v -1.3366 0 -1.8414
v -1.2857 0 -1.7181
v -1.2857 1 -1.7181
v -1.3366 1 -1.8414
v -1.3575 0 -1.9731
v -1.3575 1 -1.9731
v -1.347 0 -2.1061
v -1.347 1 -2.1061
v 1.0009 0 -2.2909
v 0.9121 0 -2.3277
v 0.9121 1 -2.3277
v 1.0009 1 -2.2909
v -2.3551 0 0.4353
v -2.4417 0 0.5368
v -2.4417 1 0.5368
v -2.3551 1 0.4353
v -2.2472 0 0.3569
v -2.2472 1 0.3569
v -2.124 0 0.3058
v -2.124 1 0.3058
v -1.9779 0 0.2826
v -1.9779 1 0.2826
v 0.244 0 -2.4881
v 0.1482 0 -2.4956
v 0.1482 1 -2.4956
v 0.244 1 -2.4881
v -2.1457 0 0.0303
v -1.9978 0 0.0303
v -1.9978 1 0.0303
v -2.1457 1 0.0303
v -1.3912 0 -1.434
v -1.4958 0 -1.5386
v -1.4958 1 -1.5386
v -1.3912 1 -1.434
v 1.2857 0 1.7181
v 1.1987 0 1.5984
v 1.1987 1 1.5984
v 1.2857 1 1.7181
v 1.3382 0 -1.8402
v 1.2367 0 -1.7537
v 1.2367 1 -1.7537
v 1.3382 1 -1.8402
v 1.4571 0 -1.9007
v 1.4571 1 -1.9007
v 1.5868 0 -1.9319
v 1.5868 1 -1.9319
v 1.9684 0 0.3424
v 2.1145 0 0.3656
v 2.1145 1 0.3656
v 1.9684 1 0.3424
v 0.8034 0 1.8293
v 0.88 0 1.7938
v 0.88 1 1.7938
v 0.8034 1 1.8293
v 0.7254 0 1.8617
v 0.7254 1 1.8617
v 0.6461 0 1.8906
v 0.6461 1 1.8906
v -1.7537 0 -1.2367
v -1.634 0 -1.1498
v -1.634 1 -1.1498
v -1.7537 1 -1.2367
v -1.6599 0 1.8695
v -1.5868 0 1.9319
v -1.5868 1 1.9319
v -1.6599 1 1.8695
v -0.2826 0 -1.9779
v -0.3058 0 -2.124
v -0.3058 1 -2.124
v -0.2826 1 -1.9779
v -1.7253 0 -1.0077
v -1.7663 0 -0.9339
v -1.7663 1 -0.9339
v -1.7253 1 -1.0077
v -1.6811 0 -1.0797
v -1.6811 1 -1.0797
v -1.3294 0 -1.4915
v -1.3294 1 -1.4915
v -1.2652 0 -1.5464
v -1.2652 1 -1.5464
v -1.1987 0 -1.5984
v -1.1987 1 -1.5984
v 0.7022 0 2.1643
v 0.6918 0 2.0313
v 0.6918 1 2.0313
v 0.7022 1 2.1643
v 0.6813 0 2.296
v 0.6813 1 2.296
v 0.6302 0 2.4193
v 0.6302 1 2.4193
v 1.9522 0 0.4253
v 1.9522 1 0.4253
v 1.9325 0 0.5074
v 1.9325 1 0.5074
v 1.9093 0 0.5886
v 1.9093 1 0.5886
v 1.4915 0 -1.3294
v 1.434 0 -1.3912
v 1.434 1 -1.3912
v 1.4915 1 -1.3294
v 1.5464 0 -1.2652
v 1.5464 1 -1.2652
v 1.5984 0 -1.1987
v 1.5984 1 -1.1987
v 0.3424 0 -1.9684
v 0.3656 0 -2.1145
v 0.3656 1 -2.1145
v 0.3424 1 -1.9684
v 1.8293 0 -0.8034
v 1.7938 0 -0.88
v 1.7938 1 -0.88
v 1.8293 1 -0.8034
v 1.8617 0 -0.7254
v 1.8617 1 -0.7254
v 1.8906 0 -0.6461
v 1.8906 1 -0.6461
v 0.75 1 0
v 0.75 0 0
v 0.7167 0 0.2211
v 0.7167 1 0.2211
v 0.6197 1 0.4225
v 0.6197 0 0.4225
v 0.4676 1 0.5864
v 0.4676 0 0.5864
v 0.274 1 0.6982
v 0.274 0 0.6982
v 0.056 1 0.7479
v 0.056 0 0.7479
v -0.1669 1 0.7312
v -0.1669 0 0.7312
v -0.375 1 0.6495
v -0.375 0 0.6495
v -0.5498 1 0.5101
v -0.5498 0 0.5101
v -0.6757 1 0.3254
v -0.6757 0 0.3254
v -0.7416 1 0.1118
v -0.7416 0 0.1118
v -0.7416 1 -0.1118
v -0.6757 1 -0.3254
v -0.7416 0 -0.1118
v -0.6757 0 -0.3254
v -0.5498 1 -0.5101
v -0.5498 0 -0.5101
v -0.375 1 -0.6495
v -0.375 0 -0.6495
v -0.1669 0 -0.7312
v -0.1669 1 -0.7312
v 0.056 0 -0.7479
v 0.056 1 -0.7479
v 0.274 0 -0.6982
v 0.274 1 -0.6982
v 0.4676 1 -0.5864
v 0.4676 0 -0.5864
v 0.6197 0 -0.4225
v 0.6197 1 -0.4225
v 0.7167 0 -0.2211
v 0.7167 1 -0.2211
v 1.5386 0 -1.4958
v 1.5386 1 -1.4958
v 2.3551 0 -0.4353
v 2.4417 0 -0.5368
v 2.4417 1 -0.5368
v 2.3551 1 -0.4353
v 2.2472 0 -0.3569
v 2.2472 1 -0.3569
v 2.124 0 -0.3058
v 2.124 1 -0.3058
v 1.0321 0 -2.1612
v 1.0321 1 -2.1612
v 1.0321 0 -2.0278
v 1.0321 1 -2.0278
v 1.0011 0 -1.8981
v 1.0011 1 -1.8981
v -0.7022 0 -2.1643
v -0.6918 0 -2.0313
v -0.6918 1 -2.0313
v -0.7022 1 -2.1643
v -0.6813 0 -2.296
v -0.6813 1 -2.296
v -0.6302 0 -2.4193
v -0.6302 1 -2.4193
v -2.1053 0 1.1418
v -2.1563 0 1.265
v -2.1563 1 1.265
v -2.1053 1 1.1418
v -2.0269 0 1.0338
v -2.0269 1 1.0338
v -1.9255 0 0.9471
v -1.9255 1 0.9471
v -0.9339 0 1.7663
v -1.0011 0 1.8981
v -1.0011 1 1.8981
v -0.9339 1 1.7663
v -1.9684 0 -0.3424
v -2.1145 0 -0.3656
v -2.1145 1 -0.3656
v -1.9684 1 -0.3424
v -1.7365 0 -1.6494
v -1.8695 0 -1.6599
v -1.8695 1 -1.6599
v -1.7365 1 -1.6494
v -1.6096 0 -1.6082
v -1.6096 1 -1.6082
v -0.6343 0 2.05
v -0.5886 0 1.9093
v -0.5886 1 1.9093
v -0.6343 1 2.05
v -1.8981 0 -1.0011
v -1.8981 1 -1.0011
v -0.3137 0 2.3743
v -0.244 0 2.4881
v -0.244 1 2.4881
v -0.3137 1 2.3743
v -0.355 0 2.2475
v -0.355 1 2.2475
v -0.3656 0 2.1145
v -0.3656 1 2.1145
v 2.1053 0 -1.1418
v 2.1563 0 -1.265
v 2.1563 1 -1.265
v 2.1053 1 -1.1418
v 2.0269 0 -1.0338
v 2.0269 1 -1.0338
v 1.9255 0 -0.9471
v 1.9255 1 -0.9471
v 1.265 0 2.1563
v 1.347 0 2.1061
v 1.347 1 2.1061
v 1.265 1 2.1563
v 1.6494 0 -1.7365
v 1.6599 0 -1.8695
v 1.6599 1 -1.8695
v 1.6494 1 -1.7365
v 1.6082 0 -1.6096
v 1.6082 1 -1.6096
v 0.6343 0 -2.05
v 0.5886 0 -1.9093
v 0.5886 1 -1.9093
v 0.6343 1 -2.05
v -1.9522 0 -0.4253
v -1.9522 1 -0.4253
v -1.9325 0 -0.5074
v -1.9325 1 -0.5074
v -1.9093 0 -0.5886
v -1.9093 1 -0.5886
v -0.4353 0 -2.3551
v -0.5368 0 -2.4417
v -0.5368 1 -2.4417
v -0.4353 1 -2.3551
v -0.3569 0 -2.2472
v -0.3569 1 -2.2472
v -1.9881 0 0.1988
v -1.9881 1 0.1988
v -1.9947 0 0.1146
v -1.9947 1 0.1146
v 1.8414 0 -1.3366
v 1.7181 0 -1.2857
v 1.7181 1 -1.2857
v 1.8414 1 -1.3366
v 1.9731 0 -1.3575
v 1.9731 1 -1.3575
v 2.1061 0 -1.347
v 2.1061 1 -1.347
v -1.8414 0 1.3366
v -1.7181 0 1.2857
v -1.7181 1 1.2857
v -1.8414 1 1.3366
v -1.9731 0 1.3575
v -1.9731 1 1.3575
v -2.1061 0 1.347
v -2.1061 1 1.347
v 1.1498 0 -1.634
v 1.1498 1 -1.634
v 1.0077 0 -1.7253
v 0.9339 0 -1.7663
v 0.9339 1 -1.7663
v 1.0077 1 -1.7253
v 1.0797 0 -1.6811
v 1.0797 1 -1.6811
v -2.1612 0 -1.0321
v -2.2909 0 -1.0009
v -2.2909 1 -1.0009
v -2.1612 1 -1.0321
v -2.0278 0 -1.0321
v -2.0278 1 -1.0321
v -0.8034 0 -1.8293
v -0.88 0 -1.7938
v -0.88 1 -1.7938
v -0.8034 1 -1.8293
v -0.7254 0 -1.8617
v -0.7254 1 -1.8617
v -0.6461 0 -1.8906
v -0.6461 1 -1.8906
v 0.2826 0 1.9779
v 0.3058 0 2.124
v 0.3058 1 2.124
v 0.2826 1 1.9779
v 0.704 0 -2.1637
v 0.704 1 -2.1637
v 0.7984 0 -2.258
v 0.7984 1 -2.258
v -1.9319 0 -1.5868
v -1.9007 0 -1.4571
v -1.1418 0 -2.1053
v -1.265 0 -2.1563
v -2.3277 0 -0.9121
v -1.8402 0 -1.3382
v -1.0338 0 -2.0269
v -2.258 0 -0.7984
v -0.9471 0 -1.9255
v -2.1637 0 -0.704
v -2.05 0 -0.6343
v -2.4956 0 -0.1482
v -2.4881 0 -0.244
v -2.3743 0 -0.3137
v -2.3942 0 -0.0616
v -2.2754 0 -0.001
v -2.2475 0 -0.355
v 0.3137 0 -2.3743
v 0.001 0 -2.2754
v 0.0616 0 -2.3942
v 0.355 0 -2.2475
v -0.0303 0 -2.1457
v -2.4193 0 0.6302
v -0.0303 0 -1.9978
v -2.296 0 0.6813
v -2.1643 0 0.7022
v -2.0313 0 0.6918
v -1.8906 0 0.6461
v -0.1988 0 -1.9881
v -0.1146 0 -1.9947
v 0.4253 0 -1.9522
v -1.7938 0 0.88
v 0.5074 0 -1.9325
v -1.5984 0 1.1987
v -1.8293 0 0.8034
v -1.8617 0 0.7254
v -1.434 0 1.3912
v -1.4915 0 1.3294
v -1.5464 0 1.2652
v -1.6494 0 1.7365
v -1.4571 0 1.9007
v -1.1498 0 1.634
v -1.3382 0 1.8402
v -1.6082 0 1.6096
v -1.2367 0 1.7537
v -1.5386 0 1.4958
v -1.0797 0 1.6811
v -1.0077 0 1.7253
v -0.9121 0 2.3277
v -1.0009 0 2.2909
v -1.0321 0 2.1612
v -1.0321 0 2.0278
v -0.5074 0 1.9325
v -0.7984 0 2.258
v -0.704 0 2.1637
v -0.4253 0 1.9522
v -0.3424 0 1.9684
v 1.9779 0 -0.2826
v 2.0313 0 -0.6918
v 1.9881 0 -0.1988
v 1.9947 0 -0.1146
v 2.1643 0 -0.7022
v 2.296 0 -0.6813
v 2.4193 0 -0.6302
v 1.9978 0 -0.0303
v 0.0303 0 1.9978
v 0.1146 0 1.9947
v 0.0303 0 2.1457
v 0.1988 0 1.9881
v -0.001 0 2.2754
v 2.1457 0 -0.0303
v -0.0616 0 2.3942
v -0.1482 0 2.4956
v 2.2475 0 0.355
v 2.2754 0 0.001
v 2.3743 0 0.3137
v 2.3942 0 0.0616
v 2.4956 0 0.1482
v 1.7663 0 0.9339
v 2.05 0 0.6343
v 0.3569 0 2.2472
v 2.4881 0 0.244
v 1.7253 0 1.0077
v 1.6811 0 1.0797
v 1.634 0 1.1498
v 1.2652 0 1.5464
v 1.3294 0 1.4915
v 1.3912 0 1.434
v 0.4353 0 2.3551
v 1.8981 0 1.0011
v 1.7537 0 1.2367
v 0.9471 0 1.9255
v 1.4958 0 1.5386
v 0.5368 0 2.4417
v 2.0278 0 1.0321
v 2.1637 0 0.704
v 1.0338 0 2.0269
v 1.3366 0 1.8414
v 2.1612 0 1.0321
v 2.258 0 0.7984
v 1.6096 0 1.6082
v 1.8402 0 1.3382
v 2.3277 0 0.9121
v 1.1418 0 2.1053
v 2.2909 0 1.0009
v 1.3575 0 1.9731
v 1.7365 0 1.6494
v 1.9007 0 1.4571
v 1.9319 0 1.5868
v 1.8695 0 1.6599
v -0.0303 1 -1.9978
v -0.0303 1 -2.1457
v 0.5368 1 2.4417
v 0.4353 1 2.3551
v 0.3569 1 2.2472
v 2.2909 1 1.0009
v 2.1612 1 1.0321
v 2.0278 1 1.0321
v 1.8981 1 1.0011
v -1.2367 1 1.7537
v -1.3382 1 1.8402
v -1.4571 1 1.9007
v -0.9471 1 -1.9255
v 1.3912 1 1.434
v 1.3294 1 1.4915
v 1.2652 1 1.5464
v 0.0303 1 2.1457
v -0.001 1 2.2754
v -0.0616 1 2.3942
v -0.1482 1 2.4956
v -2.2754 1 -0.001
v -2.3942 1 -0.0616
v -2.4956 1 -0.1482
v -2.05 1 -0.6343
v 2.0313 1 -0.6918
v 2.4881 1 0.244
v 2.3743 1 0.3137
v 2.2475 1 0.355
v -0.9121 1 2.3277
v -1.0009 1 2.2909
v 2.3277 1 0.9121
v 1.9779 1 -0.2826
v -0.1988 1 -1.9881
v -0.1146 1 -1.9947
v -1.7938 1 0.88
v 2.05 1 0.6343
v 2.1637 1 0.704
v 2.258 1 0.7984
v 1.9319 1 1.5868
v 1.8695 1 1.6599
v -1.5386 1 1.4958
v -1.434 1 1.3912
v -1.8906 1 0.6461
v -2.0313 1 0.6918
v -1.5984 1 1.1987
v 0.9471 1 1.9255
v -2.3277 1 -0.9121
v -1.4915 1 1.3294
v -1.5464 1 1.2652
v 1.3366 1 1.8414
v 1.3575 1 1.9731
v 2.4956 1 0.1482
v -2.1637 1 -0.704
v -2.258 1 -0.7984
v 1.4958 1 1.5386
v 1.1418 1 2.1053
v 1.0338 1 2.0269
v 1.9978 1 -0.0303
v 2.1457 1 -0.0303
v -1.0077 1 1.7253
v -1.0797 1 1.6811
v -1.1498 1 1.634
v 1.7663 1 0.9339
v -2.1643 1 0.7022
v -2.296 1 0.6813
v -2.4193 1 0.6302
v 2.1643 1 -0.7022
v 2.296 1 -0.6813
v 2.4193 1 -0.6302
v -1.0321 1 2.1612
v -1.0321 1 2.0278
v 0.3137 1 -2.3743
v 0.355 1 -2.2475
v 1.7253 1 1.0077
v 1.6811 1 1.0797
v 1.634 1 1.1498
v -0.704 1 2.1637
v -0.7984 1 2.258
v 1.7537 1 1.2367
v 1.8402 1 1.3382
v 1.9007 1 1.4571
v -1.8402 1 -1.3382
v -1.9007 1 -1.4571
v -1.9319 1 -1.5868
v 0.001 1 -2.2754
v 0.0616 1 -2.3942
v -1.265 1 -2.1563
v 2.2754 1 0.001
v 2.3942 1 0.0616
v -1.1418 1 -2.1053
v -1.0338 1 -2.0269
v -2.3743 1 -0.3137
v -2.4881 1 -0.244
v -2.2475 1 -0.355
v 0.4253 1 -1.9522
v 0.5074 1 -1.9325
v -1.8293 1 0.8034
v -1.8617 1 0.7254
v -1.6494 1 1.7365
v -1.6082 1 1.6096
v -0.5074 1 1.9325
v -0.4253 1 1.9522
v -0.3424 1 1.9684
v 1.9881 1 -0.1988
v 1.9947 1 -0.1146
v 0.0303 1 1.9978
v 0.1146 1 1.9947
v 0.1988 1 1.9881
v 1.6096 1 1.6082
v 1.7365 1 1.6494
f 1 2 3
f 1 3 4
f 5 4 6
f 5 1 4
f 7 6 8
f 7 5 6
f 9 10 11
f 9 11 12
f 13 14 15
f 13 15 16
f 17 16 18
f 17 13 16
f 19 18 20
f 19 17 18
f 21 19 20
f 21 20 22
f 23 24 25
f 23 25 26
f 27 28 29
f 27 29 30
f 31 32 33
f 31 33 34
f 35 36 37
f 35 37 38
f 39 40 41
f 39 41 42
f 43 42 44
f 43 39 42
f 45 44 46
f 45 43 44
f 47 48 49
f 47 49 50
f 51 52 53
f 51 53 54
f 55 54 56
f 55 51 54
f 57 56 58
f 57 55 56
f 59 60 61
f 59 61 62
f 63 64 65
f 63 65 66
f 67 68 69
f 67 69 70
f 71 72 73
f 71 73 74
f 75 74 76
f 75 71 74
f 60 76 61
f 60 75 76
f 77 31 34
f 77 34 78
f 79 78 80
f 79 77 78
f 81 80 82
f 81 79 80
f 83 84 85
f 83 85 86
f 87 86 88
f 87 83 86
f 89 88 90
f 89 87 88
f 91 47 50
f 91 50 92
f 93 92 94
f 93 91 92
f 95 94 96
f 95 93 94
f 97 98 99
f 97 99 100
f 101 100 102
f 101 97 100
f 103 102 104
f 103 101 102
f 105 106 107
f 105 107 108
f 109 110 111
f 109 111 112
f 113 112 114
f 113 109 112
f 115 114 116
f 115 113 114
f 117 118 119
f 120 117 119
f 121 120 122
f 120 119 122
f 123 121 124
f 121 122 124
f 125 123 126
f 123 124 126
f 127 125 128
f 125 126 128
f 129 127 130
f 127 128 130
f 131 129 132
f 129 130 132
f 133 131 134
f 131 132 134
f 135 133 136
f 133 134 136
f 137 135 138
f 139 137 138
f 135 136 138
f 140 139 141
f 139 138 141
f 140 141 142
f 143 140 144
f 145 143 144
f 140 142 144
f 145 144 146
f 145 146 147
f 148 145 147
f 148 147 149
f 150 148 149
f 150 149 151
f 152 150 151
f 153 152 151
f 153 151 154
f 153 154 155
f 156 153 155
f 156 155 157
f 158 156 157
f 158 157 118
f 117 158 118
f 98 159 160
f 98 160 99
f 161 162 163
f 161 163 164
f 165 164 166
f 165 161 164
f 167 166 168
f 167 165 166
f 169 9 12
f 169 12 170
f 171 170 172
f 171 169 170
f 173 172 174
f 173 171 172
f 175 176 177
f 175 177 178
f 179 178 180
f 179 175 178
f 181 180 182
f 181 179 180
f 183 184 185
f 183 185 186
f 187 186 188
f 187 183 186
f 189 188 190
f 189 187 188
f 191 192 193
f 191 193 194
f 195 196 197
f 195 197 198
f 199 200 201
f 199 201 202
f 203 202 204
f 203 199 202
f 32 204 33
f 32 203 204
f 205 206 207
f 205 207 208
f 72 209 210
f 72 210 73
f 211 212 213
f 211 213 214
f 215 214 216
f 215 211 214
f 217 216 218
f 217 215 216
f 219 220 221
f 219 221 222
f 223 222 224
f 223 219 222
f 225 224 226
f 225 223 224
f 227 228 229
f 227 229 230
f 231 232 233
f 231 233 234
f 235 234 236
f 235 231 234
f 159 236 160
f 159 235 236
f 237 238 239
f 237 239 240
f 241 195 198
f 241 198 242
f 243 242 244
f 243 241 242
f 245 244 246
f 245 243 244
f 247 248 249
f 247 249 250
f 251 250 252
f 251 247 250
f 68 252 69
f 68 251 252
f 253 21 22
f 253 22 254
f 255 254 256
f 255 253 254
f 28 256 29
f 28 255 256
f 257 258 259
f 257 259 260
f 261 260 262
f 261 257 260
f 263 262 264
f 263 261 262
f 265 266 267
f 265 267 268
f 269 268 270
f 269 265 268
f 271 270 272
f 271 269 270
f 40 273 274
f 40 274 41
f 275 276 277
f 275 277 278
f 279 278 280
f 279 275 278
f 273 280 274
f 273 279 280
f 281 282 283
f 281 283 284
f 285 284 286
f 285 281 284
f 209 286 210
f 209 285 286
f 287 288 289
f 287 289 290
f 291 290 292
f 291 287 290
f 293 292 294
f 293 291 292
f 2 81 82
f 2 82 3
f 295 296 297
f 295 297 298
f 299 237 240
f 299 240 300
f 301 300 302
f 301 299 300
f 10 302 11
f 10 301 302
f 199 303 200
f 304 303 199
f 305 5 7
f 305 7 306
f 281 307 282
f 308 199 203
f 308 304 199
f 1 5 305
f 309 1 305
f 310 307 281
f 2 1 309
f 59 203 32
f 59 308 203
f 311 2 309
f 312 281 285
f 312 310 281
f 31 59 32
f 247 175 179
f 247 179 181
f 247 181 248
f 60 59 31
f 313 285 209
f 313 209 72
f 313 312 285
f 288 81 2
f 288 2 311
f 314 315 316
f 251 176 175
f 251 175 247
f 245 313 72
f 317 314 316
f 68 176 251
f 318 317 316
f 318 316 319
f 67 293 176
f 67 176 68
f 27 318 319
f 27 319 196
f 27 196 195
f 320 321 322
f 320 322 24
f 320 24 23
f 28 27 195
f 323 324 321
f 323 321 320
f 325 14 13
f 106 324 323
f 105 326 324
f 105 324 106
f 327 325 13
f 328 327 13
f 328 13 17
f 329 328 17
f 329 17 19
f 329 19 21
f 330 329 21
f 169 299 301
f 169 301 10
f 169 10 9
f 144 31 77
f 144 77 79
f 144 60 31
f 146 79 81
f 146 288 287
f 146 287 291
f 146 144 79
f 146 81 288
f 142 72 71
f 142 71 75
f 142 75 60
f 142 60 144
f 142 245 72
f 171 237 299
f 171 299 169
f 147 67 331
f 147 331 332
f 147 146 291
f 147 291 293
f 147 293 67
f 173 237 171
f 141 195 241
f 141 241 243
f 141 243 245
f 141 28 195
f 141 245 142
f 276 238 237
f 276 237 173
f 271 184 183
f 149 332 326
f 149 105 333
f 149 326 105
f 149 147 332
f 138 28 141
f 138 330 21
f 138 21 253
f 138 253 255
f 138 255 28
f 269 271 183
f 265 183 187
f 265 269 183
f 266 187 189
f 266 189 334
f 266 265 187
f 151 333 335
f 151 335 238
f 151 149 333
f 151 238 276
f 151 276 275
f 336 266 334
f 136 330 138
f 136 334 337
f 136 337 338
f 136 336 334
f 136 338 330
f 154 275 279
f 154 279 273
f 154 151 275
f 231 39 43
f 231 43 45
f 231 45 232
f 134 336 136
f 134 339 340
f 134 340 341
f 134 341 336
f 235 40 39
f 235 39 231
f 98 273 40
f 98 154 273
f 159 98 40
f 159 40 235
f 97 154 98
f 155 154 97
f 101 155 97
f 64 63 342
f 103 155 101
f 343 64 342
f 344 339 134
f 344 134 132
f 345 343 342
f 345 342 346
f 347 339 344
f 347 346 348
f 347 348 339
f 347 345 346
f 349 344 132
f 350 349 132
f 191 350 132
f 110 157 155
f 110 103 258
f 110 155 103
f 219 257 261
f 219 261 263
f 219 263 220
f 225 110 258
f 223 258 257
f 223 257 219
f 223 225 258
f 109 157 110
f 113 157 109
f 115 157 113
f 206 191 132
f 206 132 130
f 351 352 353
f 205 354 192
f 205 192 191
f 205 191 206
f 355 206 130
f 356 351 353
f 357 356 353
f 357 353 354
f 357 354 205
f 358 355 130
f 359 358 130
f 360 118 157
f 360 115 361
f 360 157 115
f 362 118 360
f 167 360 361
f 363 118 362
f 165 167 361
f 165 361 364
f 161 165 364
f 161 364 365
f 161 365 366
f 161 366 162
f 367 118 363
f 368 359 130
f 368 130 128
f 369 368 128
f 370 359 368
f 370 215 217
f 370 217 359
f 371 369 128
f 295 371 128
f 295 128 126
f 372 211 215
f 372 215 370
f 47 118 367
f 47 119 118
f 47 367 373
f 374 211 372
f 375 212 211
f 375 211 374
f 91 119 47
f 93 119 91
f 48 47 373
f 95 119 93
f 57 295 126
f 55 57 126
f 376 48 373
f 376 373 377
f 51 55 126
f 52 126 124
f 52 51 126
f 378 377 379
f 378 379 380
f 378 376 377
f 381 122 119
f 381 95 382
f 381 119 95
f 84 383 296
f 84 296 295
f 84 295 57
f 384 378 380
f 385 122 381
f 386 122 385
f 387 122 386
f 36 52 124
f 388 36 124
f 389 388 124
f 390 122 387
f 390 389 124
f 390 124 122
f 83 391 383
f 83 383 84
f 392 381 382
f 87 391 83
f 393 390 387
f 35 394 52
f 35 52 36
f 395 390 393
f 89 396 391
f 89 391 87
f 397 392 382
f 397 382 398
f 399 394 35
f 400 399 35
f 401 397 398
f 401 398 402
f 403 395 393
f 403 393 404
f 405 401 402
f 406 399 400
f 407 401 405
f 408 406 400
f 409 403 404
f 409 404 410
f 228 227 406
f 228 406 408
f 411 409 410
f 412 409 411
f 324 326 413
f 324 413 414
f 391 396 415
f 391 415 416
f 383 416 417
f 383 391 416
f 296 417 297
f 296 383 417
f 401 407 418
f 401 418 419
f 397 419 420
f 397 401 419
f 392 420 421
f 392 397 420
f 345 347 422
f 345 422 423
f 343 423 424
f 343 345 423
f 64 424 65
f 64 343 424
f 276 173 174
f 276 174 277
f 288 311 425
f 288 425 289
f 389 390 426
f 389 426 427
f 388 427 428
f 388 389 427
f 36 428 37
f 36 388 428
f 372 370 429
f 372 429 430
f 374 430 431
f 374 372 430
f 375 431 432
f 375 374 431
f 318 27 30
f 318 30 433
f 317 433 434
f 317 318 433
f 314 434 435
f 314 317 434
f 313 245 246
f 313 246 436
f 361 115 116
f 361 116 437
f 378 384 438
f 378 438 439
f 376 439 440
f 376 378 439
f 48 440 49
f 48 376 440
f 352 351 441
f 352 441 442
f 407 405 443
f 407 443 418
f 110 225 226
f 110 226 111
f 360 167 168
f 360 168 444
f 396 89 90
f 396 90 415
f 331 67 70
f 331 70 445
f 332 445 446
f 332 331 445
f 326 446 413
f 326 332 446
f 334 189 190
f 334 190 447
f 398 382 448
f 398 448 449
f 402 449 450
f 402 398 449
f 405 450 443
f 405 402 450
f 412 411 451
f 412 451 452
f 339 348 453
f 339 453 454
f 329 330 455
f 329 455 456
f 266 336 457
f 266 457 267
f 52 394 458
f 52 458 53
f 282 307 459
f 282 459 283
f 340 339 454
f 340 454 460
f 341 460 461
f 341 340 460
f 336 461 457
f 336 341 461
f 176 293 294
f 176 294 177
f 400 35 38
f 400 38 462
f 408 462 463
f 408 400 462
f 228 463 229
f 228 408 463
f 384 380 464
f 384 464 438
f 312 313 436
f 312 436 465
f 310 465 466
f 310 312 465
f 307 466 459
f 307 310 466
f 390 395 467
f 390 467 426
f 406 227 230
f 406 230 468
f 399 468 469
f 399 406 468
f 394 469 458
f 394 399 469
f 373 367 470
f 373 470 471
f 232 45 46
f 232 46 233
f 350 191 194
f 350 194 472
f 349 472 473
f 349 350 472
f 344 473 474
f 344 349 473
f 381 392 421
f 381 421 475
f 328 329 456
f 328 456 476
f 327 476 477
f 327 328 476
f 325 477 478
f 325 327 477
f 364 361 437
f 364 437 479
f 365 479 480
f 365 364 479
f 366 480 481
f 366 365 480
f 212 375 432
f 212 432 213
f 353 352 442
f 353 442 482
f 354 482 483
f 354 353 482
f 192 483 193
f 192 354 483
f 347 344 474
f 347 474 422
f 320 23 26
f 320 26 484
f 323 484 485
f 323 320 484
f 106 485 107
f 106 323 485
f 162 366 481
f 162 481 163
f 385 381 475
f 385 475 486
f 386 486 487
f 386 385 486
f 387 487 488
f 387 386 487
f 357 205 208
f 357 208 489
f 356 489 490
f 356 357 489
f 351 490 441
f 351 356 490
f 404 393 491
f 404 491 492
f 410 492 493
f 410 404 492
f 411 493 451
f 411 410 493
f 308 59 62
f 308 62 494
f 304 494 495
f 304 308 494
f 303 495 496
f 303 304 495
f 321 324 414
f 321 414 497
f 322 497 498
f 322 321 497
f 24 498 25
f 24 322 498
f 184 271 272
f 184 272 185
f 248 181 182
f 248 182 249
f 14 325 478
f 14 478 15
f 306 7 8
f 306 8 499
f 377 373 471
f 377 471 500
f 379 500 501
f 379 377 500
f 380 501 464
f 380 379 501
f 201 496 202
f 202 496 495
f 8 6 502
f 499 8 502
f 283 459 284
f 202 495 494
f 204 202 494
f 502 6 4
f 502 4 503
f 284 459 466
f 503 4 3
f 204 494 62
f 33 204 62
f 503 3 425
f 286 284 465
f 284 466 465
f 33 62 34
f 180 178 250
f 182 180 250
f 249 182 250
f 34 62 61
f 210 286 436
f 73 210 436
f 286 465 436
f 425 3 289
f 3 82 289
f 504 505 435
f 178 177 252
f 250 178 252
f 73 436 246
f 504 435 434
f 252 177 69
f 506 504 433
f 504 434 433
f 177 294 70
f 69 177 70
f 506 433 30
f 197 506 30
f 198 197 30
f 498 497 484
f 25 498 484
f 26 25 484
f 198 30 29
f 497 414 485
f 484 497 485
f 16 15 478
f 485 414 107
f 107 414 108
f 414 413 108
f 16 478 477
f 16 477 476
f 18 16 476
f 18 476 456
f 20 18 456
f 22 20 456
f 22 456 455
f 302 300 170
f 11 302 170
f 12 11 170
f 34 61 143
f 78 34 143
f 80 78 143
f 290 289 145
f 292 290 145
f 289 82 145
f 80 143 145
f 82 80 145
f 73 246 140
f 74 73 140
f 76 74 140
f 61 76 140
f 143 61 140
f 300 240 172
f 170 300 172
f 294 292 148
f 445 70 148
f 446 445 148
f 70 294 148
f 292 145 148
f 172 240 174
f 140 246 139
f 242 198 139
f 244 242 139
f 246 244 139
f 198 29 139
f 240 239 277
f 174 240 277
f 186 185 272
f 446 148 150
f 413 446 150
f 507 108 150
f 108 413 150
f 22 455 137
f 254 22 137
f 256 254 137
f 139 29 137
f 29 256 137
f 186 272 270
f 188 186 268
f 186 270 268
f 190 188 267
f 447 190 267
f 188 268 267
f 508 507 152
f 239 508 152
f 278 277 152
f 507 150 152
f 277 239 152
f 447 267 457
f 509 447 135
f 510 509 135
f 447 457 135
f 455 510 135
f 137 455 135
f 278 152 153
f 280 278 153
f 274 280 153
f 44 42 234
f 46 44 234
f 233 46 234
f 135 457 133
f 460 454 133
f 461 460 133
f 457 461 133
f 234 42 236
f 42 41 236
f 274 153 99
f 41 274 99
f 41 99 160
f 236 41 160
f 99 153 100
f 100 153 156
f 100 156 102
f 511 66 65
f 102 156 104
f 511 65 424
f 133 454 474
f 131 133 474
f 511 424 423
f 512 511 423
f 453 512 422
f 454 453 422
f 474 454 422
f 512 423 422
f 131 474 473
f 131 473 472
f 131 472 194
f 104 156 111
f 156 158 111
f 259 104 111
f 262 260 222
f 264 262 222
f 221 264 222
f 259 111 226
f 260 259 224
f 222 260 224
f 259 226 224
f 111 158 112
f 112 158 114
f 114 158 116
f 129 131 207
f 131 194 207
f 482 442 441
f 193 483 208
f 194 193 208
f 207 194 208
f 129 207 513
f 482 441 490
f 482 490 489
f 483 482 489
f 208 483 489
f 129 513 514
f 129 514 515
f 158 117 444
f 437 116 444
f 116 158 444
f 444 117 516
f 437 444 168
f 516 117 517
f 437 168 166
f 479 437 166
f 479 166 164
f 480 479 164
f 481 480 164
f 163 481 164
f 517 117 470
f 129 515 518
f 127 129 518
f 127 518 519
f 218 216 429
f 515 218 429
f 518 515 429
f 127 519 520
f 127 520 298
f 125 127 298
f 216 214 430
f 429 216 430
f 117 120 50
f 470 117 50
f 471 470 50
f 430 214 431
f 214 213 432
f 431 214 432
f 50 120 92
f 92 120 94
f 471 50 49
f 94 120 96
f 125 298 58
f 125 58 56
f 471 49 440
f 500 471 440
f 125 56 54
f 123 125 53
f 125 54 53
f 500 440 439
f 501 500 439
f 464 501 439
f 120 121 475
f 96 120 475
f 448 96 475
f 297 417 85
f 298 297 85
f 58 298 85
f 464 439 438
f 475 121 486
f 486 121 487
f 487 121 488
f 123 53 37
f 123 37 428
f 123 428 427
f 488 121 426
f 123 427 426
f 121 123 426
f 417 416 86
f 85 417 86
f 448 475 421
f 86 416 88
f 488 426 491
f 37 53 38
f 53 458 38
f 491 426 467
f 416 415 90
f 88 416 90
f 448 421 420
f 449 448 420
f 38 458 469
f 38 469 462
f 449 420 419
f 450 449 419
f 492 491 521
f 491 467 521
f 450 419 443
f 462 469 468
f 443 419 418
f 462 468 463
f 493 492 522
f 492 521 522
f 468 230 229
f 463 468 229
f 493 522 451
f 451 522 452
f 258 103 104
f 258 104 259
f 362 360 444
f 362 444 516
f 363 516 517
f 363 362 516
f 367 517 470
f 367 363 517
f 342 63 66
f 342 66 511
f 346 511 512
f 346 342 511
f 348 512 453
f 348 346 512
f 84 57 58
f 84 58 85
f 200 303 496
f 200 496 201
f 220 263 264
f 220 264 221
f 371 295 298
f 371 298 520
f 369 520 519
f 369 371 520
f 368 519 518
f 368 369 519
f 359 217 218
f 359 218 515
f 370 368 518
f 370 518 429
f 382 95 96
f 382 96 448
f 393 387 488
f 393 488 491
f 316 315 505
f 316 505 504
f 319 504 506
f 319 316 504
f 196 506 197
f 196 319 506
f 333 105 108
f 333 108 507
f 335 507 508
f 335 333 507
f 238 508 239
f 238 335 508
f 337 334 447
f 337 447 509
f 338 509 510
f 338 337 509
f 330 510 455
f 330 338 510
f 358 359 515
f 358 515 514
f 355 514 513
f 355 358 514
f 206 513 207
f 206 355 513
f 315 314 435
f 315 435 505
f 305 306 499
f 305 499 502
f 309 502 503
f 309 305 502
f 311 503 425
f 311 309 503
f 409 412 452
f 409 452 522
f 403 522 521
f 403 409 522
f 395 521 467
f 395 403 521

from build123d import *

# Parameters (mm, degrees)
F1_R     = 0.75
F2_DEPTH = 1
F3_COUNT = 20
F3_ANGLE = 342


# Not quite as in the source:
# - a feature names something its author has since deleted; it is built from what else it names


with BuildPart() as f2:
    # F1 (on Front) → F2 (new body)
    with BuildSketch(Plane.XZ):
        with BuildLine():
            ThreePointArc((-0.342416875, 1.9684396571), (-1.2860511428, -1.5290769955), (1.998, 0))
            ThreePointArc((1.998, 0), (1.4234609517, 1.4020566747), (0.0302693503, 1.9977706992))
            ThreePointArc((0.0302693503, 1.9977706992), (-0.1567612733, 1.9918408328), (-0.342416875, 1.9684396571))
        make_face()
        Circle(F1_R, mode=Mode.SUBTRACT)
        with BuildLine():
            ThreePointArc((-0.342416875, 1.9684396571), (-0.1567612733, 1.9918408328), (0.0302693503, 1.9977706992))
            Line((0.0302693503, 1.9977706992), (0.0302693503, 2.145667056))
            ThreePointArc((0.0302693503, 2.145667056), (-0.0277660563, 2.3365498257), (-0.1482087326, 2.4956029675))
            Line((-0.1482087326, 2.4956029675), (-0.244014278, 2.4880629076))
            ThreePointArc((-0.244014278, 2.4880629076), (-0.3380927119, 2.3121265883), (-0.3655529625, 2.1145151644))
            Line((-0.3655529625, 2.1145151644), (-0.342416875, 1.9684396571))
        make_face()
    extrude(amount=-F2_DEPTH)

    # F3: F2 ×20 about axis
    f3_axis = Axis((0, 0, 0), (0, -1, 0))


with BuildPart() as f2_1:
    add(f2.part)
    for i in range(1, F3_COUNT):
        add(f2.part.rotate(f3_axis, i * F3_ANGLE / (F3_COUNT - 1)))


solid = f2_1.part
